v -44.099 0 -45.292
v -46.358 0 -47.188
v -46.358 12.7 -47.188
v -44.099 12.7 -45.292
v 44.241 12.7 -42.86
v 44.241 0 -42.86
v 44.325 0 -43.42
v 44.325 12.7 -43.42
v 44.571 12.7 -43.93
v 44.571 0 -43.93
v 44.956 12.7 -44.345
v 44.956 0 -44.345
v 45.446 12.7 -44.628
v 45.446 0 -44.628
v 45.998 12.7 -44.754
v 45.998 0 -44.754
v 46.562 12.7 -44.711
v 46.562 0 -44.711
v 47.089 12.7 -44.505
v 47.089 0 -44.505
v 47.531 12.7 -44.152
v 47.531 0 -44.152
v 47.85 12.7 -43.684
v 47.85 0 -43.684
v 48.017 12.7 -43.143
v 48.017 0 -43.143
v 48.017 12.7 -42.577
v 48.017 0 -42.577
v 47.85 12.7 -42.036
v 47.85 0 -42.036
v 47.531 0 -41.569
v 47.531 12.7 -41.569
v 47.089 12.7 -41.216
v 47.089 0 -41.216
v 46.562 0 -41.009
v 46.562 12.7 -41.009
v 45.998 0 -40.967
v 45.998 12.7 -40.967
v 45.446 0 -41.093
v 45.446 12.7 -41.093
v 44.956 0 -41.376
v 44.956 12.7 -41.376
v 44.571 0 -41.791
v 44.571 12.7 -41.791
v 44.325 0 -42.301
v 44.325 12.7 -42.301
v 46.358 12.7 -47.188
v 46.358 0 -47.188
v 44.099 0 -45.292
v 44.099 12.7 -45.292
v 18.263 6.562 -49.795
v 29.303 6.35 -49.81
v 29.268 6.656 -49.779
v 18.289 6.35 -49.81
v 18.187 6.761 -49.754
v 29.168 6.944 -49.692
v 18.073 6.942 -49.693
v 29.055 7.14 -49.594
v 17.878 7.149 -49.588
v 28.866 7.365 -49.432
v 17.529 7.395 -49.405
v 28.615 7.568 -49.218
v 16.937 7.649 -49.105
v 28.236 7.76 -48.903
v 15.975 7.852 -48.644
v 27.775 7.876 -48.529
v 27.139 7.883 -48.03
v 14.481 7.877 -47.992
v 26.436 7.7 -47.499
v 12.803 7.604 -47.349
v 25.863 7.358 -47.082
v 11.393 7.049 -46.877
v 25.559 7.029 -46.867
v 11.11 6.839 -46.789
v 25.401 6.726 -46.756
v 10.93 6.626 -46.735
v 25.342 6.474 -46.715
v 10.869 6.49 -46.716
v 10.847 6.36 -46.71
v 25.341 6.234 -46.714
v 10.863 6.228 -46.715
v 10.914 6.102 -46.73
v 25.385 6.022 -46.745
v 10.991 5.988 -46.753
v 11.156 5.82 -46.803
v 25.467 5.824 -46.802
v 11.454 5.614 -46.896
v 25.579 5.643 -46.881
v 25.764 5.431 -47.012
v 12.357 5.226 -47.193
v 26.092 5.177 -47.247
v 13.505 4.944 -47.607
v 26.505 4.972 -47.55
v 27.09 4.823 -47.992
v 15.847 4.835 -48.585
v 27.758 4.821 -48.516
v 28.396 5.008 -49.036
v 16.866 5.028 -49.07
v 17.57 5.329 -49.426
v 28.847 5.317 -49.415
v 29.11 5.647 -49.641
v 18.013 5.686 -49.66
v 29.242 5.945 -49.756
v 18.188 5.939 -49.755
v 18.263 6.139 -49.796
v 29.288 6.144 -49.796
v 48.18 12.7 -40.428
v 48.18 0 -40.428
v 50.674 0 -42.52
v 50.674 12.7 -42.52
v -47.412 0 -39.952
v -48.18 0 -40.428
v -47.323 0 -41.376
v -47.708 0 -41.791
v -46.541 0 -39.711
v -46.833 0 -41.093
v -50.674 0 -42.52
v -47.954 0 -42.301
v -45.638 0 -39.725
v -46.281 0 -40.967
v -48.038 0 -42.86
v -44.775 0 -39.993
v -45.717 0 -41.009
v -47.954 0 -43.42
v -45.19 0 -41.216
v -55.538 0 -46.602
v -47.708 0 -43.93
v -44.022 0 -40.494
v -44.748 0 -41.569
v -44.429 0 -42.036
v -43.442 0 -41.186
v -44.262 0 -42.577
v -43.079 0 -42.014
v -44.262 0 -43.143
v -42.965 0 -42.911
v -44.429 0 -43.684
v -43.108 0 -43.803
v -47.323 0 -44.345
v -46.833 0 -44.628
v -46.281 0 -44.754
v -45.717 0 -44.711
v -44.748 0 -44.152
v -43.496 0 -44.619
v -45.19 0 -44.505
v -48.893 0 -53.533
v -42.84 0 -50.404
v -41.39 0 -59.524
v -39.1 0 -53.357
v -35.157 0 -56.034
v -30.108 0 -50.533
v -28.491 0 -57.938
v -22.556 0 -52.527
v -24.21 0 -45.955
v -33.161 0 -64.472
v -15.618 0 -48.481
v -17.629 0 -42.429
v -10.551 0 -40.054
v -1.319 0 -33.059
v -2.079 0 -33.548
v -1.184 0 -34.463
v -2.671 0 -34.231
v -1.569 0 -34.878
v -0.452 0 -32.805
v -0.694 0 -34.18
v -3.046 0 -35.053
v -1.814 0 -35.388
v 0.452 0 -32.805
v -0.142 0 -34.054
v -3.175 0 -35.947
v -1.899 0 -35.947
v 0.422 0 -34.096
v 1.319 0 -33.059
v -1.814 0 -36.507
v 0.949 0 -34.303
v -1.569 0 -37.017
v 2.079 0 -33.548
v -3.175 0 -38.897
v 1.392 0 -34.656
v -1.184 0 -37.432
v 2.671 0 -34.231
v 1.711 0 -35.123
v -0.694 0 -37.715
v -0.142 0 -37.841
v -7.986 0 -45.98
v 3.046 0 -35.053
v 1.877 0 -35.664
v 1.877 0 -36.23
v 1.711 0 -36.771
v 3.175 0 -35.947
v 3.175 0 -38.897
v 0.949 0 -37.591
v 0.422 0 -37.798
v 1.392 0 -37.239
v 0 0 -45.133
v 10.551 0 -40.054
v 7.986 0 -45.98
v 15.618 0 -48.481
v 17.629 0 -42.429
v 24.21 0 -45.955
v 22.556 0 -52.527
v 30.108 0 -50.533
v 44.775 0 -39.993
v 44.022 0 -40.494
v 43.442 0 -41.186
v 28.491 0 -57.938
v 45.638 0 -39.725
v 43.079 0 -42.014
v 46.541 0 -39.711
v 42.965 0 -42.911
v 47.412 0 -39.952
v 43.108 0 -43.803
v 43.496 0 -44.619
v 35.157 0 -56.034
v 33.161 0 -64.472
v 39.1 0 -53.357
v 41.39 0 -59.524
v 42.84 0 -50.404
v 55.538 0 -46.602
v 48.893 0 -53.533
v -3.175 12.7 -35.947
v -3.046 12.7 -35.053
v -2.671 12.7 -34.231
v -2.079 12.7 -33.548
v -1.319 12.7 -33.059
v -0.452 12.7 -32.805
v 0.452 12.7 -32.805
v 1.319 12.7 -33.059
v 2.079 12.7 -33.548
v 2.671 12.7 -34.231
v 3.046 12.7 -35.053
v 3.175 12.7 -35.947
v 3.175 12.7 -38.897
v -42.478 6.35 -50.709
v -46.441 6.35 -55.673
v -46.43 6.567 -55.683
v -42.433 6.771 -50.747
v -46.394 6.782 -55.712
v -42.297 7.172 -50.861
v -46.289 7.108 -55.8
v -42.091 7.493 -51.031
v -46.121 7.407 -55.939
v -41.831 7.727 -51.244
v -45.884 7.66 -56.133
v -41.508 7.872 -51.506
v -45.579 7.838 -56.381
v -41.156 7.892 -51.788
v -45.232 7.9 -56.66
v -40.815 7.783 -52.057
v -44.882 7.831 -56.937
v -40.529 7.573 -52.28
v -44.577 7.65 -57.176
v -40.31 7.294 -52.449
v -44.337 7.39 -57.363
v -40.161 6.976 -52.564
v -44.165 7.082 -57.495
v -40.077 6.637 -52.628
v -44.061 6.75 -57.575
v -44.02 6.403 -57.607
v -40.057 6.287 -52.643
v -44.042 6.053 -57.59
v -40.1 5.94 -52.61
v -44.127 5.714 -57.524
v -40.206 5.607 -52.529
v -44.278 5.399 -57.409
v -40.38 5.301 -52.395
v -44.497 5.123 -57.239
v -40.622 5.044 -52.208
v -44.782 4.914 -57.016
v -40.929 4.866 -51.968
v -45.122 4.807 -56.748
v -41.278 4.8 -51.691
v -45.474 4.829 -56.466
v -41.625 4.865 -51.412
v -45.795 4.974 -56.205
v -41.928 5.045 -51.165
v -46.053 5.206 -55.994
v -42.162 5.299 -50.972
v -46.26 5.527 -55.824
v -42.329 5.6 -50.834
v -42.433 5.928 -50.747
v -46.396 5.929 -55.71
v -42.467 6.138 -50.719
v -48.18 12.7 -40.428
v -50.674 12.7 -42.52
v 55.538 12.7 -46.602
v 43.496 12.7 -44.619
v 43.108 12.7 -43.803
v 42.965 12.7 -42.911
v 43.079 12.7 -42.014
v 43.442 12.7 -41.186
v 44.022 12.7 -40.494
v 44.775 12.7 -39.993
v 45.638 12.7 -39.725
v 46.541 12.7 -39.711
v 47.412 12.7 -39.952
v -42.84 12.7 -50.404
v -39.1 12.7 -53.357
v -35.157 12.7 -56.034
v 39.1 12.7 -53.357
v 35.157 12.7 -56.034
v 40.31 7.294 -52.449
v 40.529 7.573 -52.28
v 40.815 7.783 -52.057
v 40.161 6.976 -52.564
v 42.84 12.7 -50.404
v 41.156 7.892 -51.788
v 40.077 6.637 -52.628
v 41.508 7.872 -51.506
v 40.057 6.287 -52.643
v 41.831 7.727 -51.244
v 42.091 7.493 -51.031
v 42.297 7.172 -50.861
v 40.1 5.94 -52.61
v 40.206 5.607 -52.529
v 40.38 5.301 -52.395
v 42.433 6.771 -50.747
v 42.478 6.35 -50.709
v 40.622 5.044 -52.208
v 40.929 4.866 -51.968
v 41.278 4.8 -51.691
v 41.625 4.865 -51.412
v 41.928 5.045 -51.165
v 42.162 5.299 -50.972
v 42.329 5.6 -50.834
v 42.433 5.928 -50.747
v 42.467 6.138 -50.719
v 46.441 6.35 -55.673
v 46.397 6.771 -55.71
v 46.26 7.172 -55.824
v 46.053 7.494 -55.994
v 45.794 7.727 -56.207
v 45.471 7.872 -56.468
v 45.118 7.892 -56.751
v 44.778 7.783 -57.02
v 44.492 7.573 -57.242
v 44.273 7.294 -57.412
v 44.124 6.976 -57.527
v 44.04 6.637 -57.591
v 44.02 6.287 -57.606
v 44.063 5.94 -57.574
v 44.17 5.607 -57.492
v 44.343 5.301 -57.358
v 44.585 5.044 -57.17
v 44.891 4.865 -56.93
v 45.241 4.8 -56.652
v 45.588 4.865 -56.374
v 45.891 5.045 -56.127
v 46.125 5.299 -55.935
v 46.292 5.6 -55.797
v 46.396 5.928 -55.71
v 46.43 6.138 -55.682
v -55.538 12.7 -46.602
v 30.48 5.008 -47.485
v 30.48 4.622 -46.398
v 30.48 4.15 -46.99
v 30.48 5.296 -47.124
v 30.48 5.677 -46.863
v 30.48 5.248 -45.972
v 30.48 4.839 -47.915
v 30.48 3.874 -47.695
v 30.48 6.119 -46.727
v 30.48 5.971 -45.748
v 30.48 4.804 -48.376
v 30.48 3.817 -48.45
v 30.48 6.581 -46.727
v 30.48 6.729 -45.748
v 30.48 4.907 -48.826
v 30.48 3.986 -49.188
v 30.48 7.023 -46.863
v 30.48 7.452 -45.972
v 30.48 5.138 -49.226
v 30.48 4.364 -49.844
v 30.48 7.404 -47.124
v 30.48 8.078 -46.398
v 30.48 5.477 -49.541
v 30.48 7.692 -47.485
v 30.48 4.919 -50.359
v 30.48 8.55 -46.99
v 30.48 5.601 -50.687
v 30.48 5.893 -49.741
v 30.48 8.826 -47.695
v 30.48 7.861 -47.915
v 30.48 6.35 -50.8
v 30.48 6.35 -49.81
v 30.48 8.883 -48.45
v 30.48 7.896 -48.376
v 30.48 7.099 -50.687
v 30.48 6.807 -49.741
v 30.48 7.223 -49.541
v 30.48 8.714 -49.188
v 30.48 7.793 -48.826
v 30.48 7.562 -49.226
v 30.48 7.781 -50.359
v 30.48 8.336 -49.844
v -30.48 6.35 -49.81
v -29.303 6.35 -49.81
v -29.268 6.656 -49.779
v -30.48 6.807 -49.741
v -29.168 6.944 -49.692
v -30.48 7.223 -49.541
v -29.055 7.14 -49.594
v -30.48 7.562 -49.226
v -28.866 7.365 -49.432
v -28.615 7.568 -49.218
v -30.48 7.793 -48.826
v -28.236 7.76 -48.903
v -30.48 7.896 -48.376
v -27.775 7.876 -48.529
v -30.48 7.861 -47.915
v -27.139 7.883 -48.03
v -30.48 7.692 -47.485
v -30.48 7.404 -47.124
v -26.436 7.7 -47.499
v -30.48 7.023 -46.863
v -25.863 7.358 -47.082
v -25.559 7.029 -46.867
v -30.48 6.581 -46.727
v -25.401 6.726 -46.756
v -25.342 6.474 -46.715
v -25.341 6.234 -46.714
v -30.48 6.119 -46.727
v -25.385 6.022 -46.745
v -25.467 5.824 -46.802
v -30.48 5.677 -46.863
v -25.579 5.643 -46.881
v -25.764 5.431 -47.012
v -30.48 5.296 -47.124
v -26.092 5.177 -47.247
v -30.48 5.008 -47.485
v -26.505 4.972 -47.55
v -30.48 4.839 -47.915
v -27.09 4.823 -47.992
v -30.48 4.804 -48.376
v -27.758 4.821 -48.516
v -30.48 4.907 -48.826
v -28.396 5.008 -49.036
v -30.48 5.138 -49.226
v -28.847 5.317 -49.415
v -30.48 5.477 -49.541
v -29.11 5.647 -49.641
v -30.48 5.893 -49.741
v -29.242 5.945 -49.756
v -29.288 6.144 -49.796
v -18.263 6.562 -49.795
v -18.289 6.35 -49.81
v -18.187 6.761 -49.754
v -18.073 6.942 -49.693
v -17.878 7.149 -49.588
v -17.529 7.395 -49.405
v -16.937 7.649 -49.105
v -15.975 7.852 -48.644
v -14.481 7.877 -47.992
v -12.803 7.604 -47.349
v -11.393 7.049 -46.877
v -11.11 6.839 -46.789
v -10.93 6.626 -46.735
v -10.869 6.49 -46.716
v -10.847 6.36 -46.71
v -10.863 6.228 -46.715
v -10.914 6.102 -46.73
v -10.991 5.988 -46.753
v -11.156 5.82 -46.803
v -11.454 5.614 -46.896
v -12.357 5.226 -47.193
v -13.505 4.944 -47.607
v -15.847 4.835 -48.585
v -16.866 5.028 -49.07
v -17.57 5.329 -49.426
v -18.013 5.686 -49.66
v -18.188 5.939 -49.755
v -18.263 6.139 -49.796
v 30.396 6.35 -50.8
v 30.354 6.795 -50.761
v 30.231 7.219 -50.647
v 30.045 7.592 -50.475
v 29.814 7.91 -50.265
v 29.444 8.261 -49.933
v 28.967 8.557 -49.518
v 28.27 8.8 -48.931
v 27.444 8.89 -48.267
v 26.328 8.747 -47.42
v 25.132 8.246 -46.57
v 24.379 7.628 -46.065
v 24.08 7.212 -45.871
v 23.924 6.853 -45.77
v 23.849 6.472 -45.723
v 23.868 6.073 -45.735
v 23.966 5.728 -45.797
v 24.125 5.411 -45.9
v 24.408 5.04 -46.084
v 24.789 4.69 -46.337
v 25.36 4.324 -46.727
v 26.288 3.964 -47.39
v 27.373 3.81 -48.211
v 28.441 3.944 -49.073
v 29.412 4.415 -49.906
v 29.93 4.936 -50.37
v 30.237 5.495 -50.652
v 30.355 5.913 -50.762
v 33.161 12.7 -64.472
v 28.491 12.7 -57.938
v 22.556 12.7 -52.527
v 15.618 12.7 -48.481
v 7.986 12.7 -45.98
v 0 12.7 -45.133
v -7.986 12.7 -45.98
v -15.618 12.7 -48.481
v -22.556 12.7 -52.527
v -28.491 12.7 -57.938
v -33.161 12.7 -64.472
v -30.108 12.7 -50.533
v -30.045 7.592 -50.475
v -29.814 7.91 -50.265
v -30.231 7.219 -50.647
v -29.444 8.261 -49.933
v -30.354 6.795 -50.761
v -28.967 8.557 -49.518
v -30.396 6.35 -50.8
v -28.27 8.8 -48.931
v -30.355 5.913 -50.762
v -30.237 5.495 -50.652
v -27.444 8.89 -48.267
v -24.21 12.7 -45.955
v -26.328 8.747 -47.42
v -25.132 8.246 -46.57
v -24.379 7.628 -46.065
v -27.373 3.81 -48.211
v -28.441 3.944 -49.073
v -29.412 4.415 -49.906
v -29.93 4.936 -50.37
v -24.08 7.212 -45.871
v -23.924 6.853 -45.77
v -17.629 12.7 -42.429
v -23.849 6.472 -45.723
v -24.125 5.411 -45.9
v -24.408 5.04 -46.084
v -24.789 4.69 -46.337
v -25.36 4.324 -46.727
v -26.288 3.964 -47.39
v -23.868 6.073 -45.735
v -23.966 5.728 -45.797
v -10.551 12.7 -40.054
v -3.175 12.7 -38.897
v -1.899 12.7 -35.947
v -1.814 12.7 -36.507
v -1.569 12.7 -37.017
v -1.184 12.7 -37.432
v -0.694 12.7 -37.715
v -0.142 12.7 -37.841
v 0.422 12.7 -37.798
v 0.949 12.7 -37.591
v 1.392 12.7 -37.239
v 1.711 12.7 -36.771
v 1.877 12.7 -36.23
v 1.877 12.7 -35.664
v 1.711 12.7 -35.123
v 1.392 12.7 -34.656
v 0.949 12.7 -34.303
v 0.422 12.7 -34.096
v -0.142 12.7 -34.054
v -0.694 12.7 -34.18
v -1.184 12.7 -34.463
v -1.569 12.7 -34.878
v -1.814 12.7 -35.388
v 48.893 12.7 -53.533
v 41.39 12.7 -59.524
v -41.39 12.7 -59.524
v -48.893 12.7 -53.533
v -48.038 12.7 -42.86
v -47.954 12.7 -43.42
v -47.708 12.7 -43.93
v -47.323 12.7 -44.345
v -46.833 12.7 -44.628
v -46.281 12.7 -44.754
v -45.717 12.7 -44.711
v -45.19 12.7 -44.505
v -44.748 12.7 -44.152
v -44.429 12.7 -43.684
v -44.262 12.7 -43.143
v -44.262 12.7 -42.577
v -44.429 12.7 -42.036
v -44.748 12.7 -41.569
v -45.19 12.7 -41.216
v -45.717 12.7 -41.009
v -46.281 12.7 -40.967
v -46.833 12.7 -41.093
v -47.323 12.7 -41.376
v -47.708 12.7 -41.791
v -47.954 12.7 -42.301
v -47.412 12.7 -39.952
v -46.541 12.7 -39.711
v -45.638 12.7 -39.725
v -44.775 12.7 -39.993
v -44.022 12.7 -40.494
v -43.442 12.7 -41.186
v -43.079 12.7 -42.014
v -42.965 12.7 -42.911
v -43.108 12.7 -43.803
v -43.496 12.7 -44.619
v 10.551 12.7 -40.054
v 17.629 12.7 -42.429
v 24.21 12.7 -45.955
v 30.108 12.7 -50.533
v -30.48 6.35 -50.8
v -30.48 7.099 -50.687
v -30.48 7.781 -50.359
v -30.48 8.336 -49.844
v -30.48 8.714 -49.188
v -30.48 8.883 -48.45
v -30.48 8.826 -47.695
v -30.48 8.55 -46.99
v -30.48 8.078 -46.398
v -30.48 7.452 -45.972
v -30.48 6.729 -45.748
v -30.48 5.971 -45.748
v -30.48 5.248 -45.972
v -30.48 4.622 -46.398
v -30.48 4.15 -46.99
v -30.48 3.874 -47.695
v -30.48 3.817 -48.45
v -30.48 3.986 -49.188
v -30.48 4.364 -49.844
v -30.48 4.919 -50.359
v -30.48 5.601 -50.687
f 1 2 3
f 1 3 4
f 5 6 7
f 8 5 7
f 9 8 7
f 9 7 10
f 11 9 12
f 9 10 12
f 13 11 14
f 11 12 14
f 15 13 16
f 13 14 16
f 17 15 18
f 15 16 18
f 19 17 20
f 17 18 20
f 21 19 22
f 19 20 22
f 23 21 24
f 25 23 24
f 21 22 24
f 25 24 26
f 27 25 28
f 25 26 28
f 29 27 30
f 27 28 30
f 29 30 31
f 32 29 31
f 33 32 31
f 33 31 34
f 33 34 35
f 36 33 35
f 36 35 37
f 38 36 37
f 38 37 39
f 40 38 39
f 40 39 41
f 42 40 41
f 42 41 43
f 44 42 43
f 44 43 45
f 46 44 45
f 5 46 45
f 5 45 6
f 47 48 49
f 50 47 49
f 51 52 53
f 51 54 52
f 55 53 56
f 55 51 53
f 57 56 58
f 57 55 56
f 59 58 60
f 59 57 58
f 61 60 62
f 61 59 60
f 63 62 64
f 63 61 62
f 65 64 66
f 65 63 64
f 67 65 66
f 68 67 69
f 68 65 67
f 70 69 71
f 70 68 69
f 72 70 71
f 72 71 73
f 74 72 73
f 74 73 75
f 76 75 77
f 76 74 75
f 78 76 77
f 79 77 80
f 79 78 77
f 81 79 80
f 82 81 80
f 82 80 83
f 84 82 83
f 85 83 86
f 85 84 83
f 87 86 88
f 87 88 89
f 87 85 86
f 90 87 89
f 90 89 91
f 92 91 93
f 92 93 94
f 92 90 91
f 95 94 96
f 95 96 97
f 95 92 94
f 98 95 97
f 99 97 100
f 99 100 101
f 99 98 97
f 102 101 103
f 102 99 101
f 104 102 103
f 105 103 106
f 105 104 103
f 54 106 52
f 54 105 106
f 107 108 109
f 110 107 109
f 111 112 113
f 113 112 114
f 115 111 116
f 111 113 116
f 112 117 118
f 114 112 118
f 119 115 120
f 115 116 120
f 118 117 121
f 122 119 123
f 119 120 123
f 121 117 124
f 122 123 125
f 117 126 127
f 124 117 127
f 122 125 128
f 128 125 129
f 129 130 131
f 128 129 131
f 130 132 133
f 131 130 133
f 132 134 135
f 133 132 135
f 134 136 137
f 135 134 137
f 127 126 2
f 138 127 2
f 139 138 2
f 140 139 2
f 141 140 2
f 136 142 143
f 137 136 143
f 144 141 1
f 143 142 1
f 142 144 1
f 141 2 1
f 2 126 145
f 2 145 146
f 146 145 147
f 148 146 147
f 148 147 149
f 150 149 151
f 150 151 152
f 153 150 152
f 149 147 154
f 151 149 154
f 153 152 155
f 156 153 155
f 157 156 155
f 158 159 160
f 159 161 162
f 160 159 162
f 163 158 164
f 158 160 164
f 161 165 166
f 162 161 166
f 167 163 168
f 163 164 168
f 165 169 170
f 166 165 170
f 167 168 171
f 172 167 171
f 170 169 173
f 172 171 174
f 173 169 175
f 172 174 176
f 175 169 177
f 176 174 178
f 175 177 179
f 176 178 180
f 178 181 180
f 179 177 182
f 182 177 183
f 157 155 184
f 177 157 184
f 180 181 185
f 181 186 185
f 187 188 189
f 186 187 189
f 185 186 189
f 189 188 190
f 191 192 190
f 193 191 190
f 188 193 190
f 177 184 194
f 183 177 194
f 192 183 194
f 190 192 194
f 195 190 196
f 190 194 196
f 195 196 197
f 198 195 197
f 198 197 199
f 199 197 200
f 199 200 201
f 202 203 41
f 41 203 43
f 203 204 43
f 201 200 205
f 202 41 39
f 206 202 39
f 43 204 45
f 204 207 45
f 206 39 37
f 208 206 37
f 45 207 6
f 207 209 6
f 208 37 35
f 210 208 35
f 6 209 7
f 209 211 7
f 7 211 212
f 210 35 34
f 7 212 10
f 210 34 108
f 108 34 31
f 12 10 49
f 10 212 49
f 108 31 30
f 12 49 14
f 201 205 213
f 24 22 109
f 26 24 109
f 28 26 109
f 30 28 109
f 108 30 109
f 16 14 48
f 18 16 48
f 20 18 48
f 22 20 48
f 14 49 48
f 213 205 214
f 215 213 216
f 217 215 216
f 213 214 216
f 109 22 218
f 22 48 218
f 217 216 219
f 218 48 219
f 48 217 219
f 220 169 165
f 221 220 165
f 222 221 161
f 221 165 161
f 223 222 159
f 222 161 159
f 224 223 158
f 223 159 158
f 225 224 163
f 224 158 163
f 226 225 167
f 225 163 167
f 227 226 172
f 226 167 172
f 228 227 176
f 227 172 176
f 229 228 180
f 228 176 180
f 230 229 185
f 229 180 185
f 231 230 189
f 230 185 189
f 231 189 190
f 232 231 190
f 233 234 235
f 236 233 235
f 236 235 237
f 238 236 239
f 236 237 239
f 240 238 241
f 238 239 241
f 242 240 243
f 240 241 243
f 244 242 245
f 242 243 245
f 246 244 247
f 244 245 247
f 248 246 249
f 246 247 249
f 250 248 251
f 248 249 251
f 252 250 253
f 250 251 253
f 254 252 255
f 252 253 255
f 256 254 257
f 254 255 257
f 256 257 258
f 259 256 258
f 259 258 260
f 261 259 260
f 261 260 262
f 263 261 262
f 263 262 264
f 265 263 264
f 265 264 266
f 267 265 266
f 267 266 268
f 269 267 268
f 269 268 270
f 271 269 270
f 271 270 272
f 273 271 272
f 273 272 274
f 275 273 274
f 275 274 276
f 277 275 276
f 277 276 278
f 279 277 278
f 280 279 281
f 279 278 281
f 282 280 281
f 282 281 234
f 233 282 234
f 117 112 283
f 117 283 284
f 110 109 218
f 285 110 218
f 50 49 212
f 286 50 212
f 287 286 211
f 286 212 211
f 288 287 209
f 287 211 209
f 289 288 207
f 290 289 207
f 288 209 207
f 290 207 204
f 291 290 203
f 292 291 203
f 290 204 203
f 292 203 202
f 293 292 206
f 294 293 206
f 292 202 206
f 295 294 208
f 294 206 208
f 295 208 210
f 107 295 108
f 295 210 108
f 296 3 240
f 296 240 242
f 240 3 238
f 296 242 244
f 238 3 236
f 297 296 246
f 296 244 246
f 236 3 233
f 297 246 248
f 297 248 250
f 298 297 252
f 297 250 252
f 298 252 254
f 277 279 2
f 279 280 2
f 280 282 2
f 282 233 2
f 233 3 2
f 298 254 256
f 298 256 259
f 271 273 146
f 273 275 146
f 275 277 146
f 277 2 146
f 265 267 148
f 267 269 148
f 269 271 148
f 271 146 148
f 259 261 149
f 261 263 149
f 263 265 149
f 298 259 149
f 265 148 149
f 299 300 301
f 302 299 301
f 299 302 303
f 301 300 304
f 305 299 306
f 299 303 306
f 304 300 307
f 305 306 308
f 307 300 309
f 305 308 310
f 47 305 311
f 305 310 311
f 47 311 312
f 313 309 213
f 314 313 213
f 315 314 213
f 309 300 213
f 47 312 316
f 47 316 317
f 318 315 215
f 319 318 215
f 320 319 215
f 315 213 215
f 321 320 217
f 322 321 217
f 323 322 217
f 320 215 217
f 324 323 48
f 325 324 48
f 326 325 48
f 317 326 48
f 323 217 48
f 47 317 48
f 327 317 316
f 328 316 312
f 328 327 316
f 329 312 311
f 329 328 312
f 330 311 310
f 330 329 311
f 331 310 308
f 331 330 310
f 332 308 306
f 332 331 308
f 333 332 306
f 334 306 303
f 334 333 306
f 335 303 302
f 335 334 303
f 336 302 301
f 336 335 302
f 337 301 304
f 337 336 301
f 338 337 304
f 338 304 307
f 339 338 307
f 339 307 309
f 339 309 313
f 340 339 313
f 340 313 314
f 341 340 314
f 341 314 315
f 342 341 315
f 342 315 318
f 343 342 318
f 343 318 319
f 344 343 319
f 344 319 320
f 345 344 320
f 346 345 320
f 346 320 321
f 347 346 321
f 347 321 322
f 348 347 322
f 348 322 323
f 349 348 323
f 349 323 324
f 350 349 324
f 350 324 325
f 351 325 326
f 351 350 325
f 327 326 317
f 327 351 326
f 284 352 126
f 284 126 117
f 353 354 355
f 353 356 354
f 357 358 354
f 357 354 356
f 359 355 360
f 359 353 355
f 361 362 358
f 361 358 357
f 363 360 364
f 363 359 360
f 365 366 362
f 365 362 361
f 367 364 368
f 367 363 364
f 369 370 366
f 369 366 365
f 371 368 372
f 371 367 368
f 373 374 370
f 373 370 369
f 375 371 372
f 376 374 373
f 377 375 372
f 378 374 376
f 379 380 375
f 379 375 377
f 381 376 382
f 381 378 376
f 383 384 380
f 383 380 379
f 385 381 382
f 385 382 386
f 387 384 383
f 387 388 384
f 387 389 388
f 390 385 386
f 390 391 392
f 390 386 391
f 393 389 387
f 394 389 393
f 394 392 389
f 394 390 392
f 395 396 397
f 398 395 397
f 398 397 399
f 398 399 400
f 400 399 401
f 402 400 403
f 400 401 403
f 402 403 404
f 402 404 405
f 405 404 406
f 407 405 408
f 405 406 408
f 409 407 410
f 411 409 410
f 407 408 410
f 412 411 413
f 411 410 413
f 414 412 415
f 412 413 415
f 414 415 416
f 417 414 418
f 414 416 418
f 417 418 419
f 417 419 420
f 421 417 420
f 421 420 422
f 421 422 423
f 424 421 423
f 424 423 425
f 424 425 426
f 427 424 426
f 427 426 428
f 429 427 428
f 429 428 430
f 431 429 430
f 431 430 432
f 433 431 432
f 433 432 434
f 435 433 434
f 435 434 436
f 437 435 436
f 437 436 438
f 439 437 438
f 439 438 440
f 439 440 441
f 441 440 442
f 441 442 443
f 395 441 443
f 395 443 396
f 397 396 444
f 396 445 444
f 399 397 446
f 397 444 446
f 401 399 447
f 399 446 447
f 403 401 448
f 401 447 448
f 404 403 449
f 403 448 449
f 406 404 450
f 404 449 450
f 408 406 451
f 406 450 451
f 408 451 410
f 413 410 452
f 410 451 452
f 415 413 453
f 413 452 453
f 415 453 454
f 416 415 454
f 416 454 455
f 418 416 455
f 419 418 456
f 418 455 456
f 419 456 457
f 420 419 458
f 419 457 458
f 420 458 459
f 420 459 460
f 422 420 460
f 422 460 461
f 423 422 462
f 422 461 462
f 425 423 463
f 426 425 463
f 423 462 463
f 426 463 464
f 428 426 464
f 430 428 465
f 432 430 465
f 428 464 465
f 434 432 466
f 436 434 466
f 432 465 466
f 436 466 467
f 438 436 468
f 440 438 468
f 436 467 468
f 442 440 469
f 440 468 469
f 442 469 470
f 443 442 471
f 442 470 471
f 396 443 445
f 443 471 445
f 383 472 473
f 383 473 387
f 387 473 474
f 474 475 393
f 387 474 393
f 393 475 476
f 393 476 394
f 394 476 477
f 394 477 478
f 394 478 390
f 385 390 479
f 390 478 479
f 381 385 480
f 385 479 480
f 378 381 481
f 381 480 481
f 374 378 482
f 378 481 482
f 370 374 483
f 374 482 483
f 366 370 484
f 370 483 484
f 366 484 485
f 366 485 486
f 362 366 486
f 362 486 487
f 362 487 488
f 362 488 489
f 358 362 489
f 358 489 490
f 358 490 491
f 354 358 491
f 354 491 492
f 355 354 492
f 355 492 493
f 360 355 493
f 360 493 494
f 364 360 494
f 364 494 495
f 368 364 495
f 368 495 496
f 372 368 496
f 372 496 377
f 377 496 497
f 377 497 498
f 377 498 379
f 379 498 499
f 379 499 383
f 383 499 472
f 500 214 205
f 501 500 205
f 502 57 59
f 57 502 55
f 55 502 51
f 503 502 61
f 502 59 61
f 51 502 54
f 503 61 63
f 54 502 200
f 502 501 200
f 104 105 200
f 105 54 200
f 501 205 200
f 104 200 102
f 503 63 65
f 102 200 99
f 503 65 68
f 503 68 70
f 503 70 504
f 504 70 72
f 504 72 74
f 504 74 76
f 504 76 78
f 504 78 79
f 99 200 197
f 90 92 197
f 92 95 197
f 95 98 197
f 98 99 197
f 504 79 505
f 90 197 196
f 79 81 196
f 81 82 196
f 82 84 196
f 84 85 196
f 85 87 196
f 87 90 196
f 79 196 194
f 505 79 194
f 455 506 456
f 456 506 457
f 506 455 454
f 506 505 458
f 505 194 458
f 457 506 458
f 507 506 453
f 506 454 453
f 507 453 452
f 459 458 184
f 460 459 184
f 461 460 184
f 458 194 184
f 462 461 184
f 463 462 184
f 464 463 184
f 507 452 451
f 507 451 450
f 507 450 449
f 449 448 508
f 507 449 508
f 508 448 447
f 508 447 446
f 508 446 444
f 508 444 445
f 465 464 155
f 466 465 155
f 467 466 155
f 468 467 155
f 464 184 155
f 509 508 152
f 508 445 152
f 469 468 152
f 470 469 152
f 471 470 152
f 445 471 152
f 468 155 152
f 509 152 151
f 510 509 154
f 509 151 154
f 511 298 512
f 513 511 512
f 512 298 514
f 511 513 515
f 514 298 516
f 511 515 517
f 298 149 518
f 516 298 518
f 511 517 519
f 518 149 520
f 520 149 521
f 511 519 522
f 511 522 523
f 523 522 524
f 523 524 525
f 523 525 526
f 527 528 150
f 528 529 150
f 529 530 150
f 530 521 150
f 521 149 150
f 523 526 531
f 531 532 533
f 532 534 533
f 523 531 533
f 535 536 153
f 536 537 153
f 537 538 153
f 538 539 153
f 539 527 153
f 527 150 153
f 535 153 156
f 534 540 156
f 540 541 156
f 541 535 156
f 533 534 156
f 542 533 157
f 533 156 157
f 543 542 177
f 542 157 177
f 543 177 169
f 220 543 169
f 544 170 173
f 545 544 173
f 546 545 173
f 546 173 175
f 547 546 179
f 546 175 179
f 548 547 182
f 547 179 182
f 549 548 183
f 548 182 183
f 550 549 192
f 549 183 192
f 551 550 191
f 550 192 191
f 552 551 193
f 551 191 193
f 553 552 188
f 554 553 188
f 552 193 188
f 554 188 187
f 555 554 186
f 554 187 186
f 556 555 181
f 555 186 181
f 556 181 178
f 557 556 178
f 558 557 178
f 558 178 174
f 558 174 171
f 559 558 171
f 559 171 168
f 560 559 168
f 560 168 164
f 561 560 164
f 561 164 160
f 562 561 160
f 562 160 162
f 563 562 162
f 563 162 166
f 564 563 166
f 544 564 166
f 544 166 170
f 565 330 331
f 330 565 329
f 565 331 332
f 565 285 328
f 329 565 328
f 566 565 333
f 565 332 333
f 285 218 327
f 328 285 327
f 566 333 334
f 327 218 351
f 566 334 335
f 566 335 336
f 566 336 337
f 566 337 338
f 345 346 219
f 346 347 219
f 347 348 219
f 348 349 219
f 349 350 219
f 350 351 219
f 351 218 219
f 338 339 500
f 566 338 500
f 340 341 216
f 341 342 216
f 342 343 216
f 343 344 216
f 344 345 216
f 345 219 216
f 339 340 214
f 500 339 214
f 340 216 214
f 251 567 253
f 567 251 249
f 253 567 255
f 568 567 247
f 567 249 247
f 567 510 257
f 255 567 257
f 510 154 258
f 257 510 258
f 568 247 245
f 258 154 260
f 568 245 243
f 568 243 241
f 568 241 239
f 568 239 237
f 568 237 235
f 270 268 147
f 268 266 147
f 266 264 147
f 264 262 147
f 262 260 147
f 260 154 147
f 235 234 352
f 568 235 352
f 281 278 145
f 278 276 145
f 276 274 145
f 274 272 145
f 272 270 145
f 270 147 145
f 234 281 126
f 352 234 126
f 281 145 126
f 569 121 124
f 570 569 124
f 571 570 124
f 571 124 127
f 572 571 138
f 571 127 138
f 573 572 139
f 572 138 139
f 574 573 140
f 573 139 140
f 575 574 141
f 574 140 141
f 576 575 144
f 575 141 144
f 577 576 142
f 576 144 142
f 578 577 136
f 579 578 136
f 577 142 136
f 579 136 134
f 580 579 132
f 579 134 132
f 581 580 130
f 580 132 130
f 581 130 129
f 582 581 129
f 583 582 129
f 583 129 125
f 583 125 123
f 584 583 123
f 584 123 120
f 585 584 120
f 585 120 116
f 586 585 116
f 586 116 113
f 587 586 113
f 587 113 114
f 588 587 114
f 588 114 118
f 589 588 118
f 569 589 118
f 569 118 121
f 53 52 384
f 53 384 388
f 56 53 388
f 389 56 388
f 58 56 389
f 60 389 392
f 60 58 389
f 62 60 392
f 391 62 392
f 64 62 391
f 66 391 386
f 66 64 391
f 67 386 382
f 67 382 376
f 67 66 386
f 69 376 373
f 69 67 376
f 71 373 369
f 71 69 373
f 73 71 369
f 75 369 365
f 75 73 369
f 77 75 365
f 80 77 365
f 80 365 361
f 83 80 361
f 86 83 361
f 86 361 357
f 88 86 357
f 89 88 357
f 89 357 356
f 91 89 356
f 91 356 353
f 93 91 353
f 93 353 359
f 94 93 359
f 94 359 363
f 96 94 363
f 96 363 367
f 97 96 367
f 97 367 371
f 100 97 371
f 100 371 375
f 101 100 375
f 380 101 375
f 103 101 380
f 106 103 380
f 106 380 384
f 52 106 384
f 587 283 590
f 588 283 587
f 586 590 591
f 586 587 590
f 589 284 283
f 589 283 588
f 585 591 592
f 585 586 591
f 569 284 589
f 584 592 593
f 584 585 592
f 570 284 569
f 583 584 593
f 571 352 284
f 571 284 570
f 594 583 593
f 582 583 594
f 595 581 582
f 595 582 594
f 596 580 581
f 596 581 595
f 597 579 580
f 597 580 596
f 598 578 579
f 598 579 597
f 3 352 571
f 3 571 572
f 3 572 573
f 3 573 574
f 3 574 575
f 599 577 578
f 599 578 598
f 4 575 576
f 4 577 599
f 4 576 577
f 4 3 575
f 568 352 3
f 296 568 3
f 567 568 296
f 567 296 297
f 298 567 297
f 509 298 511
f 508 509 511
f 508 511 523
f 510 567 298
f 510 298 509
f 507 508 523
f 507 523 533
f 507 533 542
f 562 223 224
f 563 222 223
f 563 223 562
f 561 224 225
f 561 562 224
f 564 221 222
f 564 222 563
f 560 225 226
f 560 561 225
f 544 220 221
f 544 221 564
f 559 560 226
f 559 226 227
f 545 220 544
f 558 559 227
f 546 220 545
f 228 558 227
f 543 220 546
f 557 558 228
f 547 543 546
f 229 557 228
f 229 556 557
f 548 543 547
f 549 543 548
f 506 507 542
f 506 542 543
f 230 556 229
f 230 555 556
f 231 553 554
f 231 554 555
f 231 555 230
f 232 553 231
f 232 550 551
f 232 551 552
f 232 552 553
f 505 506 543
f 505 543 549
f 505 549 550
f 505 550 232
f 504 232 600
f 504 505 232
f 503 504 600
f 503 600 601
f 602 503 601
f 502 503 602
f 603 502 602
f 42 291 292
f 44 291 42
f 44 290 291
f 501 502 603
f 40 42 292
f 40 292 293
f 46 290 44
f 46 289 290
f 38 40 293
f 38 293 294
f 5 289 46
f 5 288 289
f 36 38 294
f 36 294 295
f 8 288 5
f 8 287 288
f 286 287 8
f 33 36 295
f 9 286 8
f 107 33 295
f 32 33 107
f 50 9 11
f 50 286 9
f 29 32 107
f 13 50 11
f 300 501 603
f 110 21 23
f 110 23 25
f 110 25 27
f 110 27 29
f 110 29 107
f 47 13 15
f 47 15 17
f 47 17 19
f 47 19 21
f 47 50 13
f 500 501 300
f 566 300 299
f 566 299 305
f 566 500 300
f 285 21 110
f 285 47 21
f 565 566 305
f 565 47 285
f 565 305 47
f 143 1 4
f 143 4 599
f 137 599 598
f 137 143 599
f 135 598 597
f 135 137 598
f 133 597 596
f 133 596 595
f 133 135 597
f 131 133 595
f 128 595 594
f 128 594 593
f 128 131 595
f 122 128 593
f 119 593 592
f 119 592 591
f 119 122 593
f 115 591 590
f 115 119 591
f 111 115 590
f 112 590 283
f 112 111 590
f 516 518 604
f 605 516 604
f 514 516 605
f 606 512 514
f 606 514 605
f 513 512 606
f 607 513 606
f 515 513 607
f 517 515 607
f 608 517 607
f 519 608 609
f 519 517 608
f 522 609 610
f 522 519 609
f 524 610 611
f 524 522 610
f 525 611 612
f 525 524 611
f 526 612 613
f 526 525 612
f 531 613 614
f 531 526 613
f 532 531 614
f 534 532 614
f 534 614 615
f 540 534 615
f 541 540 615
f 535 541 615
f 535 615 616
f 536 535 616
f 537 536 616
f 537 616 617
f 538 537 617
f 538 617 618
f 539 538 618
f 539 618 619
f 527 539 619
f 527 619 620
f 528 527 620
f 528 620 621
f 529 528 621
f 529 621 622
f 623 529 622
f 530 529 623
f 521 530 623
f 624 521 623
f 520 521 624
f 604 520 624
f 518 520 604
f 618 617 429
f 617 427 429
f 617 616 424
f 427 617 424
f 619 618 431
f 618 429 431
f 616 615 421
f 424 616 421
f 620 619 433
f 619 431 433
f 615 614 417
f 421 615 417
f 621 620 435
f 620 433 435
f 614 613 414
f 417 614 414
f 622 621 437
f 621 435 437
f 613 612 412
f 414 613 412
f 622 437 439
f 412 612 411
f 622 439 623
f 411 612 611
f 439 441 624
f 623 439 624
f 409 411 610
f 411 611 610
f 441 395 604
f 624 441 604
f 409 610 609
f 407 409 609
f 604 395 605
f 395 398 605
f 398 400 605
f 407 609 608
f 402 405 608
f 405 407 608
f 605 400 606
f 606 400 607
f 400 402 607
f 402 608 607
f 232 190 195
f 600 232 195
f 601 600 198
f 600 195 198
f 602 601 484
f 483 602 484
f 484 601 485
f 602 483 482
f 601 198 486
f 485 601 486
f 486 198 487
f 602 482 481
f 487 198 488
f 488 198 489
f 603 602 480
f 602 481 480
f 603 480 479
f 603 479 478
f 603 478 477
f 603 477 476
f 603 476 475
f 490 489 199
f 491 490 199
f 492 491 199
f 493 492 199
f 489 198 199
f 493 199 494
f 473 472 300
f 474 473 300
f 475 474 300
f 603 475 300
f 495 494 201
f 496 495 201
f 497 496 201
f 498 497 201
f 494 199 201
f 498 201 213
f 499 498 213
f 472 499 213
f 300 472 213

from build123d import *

# Parameters (mm, degrees)
BOSS_EXTRUDE1_DEPTH     = 12.7
CUT_EXTRUDE1_REACH      = 105.136
CUT_EXTRUDE1_END_RADIUS = 66.15
SKETCH4_R               = 1.55
BOSS_EXTRUDE2_START     = -12.7
BOSS_EXTRUDE2_DEPTH     = 12.7
BOSS_EXTRUDE4_START     = -12.7
BOSS_EXTRUDE4_DEPTH     = 12.7
CUT_EXTRUDE2_REACH      = 88.037
CUT_EXTRUDE2_END_RADIUS = 44.45
SKETCH9_R               = 1.55
BOSS_EXTRUDE3_START     = -22.86
SKETCH9_3_R             = 2.54
SKETCH9_3_R_2           = 1.55
BOSS_EXTRUDE3_DEPTH     = 7.62
F_6_CLEARANCE_HOLE1_D   = 3.7973


with BuildPart() as part:
    # Sketch1 → Boss-Extrude1 (new body)
    with BuildSketch(Plane(origin=(0, 0, 0), x_dir=(1, 0, 0), z_dir=(0, 1, 0))):
        with BuildLine():
            ThreePointArc((-33.160552015, 64.471914738), (-45.240476214, 56.65288441), (-55.538222126, 46.602101702))
            Line((-55.538222126, 46.602101702), (-50.673839912, 42.520400381))
            ThreePointArc((-50.673839912, 42.520400381), (-43.444022026, 49.884260546), (-35.15688403, 56.034061117))
            ThreePointArc((-35.15688403, 56.034061117), (0, 38.783252378), (35.15688403, 56.034061117))
            ThreePointArc((35.15688403, 56.034061117), (43.444022026, 49.884260546), (50.673839912, 42.520400381))
            Line((50.673839912, 42.520400381), (55.538222126, 46.602101702))
            ThreePointArc((55.538222126, 46.602101702), (45.240476214, 56.65288441), (33.160552015, 64.471914738))
            ThreePointArc((33.160552015, 64.471914738), (0, 45.133252378), (-33.160552015, 64.471914738))
        make_face()
    extrude(amount=BOSS_EXTRUDE1_DEPTH)

    # Cut-Extrude1: up to this cylinder (the profile starts outside it)
    cut_extrude1_end = Plane(origin=(0, 6.35, 0), z_dir=(0, -1, 0)) * Cylinder(CUT_EXTRUDE1_END_RADIUS, 343.572, mode=Mode.PRIVATE)
    # Sketch4 → Cut-Extrude1 (cut, up to the surface)
    with BuildSketch(Plane(origin=(-45.240476214, 12.7, -56.65288441), x_dir=(-0.7814190953093677, 0, 0.6240065684637377), z_dir=(-0.6240065684637377, 0, -0.7814190953093677)), mode=Mode.PRIVATE) as cut_extrude1_sk1:
        with Locations((0, -6.35)):
            Circle(SKETCH4_R)
    cut_extrude1_tool1 = extrude(cut_extrude1_sk1.sketch, amount=-CUT_EXTRUDE1_REACH, mode=Mode.PRIVATE) - cut_extrude1_end
    cut_extrude1 = cut_extrude1_tool1.solids().sort_by_distance((-45.240476, 6.35, -56.652884))[0]
    add(cut_extrude1, mode=Mode.SUBTRACT)

    # Sketch5 → Boss-Extrude2 (add)
    with BuildSketch(Plane(origin=(0, 12.7, 0), x_dir=(1, 0, 0), z_dir=(0, 1, 0)).offset(BOSS_EXTRUDE2_START)):
        with BuildLine():
            Line((-48.180298109, 40.428070373), (-50.673839912, 42.520400381))
            ThreePointArc((-50.673839912, 42.520400381), (-48.57209115, 44.906285321), (-46.358122599, 47.188419862))
            Line((-46.358122599, 47.188419862), (-44.098596788, 45.292452587))
            ThreePointArc((-44.098596788, 45.292452587), (-43.707256341, 40.81941082), (-48.180298109, 40.428070373))
        make_face()
    boss_extrude2 = extrude(amount=BOSS_EXTRUDE2_DEPTH)

    # Sketch10 → Boss-Extrude4 (add)
    with BuildSketch(Plane(origin=(0, 12.7, 0), x_dir=(1, 0, 0), z_dir=(0, 1, 0)).offset(BOSS_EXTRUDE4_START)):
        with BuildLine():
            Line((-3.175, 38.896790239), (-3.175, 35.947188775))
            ThreePointArc((-3.175, 35.947188775), (0, 32.772188775), (3.175, 35.947188775))
            Line((3.175, 35.947188775), (3.175, 38.896790239))
            ThreePointArc((3.175, 38.896790239), (0, 38.783252378), (-3.175, 38.896790239))
        make_face()
    extrude(amount=BOSS_EXTRUDE4_DEPTH)

    # Cut-Extrude2: up to this cylinder (the profile starts inside it)
    cut_extrude2_end = Plane(origin=(0, 6.35, -83.233252378), z_dir=(0, -1, 0)) * Cylinder(CUT_EXTRUDE2_END_RADIUS, 265.974, mode=Mode.PRIVATE)
    # Sketch9 → Cut-Extrude2 (cut, up to the surface)
    with BuildSketch(Plane(origin=(0, 0, 0), x_dir=(0, 0, -1), z_dir=(1, 0, 0)), mode=Mode.PRIVATE) as cut_extrude2_sk1:
        with Locations((48.26, 6.35)):
            Circle(SKETCH9_R)
    cut_extrude2_tool1 = extrude(cut_extrude2_sk1.sketch, amount=-CUT_EXTRUDE2_REACH, mode=Mode.PRIVATE) & cut_extrude2_end
    cut_extrude2 = cut_extrude2_tool1.solids().sort_by_distance((0, 6.35, -48.26))[0]
    add(cut_extrude2, mode=Mode.SUBTRACT)

    # Sketch9<3> → Boss-Extrude3 (add)
    with BuildSketch(Plane(origin=(0, 0, 0), x_dir=(0, 0, -1), z_dir=(1, 0, 0)).offset(BOSS_EXTRUDE3_START)):
        with Locations((48.26, 6.35)):
            Circle(SKETCH9_3_R)
        with Locations((48.26, 6.35)):
            Circle(SKETCH9_3_R_2, mode=Mode.SUBTRACT)
    boss_extrude3 = extrude(amount=-BOSS_EXTRUDE3_DEPTH)

    # Mirror1: Cut-Extrude1, Boss-Extrude2, Cut-Extrude2, Boss-Extrude3 across plane
    add(cut_extrude1.mirror(Plane(origin=(0, 0, 0), x_dir=(0, 0, 1), z_dir=(1, 0, 0))), mode=Mode.SUBTRACT)
    add(boss_extrude2.mirror(Plane(origin=(0, 0, 0), x_dir=(0, 0, 1), z_dir=(1, 0, 0))))
    add(cut_extrude2.mirror(Plane(origin=(0, 0, 0), x_dir=(0, 0, 1), z_dir=(1, 0, 0))), mode=Mode.SUBTRACT)
    add(boss_extrude3.mirror(Plane(origin=(0, 0, 0), x_dir=(0, 0, 1), z_dir=(1, 0, 0))))

    # #6 Clearance Hole1 (through all)
    with Locations(Plane(origin=(0, 12.7, 0), x_dir=(1, 0, 0), z_dir=(0, 1, 0))):
        with Locations((-46.139447448, 42.86026148), (46.139447448, 42.86026148), (0, 35.947188775)):
            Hole(F_6_CLEARANCE_HOLE1_D / 2)


solid = part.part
